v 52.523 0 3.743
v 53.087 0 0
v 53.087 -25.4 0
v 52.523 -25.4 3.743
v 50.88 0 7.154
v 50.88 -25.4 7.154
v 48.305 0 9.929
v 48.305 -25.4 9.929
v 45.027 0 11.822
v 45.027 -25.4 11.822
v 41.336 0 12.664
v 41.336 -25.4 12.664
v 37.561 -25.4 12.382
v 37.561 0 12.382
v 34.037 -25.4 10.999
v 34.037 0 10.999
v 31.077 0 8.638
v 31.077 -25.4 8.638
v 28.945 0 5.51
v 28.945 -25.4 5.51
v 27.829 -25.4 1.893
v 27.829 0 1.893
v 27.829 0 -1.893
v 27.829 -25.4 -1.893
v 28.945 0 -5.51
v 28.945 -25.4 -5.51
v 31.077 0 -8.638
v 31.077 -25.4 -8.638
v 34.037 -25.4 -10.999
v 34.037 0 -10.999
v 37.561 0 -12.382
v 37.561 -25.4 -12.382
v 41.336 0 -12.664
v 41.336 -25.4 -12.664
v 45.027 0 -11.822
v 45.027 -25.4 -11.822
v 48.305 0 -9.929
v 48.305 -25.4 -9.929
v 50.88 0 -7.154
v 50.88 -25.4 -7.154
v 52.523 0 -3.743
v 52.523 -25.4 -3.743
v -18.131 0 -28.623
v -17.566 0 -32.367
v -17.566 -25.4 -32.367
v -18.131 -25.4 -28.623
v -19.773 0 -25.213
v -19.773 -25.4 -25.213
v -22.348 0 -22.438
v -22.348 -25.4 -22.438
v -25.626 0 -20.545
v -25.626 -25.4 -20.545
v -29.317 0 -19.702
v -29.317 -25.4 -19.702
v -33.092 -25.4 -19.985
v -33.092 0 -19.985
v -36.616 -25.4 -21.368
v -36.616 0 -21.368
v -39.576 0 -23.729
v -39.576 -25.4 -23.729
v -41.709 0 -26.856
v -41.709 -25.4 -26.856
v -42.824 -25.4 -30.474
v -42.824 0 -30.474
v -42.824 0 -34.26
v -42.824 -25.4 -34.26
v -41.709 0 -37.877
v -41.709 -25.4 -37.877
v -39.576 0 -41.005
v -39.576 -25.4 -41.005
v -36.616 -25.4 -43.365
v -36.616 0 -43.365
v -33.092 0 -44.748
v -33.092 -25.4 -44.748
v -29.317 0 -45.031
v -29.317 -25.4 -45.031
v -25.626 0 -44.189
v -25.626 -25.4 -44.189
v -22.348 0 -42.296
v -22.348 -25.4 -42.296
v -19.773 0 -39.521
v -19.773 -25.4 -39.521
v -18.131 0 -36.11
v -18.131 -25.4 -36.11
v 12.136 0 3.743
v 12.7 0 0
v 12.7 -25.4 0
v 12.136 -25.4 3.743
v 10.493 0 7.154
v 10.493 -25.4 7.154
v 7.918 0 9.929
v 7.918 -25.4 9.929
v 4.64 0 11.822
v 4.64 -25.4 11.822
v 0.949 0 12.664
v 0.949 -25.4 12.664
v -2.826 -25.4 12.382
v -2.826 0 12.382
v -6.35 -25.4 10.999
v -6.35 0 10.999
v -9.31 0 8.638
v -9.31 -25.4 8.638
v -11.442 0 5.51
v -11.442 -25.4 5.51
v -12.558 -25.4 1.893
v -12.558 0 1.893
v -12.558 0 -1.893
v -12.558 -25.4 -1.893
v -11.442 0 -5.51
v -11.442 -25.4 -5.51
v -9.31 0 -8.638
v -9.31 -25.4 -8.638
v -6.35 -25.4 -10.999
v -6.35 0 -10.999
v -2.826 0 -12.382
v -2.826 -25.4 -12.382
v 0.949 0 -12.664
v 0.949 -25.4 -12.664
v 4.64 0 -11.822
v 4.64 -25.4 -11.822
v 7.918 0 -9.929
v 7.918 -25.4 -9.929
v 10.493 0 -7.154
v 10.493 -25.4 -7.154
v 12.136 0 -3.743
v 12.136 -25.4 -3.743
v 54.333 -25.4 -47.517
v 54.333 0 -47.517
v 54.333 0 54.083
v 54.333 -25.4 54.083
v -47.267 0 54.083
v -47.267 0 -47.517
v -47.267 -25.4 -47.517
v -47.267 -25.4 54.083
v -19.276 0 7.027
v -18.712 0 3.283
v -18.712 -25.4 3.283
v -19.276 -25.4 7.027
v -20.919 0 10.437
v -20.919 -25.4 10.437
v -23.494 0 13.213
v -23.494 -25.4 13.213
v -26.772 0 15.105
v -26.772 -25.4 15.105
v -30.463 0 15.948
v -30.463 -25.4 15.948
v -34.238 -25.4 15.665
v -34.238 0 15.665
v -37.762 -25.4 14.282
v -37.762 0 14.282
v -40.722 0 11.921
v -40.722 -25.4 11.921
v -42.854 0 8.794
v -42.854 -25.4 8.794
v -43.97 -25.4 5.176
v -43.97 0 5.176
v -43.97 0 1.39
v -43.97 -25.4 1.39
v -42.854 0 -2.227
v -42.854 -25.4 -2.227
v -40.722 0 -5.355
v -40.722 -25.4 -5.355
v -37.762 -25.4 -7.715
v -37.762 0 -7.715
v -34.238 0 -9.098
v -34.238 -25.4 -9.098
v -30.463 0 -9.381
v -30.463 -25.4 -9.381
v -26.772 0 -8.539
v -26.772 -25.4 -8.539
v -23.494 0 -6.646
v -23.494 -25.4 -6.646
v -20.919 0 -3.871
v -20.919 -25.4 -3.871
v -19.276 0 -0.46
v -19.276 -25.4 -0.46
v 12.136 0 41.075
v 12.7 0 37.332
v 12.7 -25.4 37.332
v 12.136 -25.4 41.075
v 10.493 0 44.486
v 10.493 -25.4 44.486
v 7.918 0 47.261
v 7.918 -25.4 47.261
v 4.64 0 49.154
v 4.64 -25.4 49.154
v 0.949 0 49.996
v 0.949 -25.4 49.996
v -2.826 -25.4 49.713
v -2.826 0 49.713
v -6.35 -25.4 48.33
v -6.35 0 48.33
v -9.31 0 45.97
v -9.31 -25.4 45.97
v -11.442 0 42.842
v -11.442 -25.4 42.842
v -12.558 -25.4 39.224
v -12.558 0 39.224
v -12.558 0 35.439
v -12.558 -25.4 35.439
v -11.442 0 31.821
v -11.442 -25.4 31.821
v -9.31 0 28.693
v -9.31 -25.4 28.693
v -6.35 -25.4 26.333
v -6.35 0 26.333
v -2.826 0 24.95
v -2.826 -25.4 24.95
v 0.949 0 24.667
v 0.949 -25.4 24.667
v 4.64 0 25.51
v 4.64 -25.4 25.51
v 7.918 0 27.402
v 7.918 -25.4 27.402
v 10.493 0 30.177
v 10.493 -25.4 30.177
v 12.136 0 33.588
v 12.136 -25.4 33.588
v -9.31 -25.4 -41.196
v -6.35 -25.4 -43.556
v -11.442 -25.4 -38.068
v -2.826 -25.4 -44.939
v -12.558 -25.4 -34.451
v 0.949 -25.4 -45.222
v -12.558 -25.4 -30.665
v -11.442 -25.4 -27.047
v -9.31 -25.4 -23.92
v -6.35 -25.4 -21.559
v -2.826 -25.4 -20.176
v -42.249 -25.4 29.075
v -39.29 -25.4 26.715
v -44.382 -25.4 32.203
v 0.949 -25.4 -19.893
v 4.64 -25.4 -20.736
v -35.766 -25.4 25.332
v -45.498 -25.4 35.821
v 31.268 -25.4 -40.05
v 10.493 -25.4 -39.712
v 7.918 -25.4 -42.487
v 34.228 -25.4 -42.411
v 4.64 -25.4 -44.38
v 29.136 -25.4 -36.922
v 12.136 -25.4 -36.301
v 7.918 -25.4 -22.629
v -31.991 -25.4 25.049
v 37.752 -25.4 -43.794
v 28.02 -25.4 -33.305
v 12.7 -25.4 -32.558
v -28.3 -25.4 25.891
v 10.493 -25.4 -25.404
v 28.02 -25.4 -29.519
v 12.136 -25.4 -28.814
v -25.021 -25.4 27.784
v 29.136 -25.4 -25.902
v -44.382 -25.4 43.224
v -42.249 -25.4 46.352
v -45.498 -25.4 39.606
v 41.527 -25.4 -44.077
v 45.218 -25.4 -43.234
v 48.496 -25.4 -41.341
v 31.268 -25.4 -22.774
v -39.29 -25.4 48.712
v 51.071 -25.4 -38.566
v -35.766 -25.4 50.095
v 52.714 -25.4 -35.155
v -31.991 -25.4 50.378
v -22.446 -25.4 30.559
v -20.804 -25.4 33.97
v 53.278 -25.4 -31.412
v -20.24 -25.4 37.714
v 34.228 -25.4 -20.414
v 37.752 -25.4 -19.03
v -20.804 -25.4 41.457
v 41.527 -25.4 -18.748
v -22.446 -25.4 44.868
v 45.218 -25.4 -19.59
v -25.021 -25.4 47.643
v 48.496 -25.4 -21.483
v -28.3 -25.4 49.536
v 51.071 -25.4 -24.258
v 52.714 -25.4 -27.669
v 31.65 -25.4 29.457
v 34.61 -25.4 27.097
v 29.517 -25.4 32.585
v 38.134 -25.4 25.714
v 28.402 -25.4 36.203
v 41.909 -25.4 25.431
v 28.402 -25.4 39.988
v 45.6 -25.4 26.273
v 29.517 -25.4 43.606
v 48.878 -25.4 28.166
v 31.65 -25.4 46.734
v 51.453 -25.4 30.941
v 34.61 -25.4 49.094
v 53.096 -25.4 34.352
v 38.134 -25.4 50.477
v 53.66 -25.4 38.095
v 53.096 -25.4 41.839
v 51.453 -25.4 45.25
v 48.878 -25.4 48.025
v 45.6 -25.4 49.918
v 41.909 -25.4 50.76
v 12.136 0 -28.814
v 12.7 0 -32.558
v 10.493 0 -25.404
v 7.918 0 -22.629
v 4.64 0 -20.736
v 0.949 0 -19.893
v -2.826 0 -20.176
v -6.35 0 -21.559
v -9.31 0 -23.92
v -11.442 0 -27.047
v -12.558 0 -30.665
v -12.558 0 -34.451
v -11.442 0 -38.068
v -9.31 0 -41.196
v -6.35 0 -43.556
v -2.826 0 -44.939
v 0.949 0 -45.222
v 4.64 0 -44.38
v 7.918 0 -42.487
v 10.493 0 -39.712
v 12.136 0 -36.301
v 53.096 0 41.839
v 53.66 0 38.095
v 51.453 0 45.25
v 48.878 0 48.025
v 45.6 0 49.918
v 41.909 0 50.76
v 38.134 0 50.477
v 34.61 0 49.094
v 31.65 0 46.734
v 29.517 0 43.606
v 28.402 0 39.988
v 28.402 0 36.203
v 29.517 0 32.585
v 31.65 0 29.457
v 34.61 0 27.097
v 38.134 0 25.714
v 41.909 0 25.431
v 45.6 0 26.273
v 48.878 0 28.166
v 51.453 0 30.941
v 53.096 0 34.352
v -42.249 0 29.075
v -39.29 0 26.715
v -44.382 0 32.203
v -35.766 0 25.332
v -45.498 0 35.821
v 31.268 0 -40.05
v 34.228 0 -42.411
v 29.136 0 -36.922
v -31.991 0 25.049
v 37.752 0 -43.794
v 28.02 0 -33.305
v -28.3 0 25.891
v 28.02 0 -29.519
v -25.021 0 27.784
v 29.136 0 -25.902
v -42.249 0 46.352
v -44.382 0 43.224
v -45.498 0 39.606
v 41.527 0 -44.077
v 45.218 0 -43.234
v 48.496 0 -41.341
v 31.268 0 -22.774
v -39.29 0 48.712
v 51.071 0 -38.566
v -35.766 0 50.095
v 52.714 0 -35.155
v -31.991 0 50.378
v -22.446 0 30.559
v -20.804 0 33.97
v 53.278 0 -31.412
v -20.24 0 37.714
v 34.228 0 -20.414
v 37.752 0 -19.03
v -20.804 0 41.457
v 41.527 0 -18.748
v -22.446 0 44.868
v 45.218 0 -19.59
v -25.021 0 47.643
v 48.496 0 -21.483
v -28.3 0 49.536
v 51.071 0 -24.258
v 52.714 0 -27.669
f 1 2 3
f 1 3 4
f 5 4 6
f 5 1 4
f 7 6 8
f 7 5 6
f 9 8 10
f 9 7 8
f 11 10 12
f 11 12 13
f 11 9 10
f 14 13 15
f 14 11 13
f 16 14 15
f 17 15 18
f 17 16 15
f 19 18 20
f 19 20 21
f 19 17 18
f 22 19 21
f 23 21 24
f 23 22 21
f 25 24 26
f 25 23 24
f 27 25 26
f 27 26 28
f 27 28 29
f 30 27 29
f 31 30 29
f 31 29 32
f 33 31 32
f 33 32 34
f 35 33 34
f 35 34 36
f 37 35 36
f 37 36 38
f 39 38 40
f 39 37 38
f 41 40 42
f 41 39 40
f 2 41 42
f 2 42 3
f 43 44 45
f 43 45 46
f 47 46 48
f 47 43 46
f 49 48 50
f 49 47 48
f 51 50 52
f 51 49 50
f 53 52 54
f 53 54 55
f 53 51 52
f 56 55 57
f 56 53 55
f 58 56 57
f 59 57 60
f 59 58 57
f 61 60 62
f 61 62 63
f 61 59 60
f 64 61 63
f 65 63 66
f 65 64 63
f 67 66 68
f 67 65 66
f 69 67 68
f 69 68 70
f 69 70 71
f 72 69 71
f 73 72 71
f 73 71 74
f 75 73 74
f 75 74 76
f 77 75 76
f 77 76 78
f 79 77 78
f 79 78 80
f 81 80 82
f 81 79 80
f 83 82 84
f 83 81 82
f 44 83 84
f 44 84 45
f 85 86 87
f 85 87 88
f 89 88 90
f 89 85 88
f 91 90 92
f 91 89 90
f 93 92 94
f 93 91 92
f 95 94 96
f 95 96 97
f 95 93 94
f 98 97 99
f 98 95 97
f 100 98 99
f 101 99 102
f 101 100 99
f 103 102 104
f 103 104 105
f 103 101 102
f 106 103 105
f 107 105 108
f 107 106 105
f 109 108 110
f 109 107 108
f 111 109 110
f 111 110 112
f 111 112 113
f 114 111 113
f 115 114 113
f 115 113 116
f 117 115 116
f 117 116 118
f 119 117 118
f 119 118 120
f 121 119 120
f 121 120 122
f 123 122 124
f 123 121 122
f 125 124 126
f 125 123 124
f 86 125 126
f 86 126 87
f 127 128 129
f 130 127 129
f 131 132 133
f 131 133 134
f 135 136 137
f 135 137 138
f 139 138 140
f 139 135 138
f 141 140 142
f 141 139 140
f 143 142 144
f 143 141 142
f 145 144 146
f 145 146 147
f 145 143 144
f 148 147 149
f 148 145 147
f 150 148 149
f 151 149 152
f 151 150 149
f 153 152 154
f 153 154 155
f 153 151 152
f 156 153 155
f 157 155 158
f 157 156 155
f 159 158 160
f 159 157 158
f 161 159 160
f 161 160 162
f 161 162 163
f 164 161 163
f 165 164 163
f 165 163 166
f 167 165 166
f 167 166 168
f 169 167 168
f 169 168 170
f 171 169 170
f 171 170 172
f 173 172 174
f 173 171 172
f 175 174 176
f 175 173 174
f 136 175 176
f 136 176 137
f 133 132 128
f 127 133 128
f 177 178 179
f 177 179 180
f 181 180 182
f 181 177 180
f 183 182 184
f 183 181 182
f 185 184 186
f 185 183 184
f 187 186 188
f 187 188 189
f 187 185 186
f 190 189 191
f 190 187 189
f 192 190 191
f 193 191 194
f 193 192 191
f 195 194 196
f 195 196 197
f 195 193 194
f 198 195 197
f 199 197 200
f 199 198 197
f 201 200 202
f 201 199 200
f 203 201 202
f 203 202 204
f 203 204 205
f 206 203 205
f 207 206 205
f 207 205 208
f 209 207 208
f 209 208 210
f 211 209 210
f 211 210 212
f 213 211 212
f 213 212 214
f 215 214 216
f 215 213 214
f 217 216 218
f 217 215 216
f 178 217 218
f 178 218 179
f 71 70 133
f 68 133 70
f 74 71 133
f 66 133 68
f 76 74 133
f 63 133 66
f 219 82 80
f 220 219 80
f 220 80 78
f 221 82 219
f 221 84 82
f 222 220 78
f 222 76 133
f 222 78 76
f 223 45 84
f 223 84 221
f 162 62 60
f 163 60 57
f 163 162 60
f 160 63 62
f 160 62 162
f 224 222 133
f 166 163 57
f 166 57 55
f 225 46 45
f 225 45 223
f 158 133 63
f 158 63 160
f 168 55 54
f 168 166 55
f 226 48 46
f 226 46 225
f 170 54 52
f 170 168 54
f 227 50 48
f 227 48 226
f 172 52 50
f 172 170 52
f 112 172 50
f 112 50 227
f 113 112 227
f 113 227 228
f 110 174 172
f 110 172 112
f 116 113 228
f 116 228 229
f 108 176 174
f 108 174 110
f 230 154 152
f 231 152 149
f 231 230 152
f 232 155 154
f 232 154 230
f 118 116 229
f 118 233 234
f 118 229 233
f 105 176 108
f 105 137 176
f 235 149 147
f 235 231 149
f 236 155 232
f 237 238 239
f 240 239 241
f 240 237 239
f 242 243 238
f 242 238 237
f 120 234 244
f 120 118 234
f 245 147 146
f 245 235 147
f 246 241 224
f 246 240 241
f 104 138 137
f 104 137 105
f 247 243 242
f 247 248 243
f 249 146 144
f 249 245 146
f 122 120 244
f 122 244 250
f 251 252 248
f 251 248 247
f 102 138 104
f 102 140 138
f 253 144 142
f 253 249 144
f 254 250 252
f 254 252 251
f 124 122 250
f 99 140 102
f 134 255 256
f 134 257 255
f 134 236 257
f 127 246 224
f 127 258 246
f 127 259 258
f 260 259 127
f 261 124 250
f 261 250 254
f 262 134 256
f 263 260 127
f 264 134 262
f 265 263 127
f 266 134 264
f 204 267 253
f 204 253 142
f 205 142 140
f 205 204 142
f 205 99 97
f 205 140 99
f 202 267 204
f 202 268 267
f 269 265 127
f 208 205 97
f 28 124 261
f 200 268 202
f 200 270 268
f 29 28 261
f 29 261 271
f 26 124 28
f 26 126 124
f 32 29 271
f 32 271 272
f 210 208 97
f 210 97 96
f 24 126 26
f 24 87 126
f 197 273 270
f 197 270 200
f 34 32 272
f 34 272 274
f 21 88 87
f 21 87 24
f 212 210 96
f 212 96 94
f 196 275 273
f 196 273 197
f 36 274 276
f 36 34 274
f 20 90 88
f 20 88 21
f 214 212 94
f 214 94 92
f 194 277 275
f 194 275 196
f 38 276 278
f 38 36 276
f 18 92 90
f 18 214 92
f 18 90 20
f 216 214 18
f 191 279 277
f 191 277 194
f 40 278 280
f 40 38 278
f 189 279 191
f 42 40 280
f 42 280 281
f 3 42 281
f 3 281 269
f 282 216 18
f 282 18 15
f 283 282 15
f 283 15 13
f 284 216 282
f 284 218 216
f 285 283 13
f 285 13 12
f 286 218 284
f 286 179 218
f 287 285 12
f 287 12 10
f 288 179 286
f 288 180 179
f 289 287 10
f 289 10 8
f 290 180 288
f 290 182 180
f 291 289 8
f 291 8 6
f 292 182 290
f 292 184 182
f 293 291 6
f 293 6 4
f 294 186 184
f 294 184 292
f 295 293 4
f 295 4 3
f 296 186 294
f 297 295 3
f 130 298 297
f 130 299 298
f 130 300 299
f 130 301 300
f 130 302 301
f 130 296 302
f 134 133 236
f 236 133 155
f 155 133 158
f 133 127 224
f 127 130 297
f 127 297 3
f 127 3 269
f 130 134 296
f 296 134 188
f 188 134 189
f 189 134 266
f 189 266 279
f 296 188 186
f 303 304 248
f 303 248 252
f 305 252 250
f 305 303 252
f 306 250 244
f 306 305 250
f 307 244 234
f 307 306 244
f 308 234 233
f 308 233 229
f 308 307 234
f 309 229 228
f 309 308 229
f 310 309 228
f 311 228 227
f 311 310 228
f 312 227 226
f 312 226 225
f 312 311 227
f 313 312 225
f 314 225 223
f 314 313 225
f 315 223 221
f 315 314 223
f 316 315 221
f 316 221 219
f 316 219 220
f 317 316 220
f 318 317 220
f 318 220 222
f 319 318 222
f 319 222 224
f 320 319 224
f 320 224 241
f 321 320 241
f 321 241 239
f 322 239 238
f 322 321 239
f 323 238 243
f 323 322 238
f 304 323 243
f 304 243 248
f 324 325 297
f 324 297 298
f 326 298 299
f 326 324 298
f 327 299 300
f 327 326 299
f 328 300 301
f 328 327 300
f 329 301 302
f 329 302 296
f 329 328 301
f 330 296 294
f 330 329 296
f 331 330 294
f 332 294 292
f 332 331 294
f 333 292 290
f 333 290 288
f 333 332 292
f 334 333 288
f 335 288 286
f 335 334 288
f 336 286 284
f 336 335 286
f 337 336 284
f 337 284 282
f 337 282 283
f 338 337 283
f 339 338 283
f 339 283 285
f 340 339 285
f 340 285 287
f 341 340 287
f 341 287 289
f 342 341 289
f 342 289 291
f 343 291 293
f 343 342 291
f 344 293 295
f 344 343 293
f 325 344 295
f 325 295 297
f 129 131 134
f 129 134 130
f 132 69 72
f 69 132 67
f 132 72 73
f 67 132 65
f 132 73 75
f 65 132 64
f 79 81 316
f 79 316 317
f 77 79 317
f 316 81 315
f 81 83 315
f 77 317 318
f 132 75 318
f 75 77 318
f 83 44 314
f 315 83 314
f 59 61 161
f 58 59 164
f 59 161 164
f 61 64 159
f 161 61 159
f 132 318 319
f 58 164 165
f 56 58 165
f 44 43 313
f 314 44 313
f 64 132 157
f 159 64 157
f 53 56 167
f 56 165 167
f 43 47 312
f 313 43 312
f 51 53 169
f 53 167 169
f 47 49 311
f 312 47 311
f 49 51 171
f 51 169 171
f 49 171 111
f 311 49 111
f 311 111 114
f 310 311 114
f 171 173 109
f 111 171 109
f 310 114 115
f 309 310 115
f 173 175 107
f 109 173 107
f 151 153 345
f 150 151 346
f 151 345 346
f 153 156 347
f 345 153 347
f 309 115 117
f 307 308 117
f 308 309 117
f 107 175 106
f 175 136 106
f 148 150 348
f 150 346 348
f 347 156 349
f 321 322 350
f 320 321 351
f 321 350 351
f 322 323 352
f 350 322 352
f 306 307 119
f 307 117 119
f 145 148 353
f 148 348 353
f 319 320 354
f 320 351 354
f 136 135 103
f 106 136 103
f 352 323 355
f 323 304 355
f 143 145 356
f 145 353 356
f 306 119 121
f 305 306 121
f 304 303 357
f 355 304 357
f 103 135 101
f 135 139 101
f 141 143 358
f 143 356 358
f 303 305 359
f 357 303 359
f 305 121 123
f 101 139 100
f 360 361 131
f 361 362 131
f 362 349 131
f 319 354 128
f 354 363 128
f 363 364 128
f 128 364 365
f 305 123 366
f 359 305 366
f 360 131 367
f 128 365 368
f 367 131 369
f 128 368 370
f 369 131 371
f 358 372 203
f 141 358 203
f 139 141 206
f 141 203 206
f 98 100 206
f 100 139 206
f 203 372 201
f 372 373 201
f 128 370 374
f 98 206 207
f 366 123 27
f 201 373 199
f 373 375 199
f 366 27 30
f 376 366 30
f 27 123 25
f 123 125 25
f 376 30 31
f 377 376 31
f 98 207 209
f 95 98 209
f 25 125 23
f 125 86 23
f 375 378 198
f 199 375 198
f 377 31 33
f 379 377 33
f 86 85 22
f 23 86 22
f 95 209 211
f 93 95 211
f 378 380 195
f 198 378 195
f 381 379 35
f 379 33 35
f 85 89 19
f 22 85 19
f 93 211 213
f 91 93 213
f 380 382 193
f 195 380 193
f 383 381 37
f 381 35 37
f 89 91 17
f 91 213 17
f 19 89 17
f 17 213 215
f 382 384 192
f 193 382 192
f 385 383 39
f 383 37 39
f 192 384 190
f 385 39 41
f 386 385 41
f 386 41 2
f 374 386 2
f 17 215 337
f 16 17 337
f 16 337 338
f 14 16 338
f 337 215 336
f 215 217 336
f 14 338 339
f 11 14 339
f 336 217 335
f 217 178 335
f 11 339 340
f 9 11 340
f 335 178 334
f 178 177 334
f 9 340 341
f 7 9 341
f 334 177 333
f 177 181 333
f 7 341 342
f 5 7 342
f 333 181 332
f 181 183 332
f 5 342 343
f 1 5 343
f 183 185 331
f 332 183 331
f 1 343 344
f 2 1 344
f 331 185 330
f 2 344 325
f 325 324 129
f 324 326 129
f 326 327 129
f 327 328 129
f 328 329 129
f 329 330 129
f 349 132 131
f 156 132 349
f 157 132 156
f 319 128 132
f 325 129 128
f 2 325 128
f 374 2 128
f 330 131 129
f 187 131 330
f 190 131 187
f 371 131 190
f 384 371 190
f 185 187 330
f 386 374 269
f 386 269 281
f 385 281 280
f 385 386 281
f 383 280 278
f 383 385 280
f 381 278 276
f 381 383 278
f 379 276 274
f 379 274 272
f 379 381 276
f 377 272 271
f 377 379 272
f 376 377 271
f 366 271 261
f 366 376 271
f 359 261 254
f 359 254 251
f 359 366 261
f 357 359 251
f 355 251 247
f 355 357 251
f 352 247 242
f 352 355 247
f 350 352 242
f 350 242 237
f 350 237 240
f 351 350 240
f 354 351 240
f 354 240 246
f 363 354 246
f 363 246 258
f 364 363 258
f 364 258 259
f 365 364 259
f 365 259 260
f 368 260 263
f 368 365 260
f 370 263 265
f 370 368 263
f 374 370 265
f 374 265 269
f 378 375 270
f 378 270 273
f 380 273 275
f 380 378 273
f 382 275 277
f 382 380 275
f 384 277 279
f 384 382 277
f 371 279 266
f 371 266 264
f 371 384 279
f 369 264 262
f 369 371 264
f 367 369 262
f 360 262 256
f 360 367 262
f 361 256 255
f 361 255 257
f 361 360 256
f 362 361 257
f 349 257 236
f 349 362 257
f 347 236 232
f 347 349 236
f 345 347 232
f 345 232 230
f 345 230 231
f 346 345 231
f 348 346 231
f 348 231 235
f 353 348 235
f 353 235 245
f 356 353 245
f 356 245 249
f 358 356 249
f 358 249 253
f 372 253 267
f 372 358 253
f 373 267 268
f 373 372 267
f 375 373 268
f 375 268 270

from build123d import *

# Parameters (mm, degrees)
F0_W     = 101.6
F0_H     = 101.6
F0_R     = 12.7
F1_DEPTH = 25.4


with BuildPart() as f1:
    # F0 (on Front) → F1 (new body)
    with BuildSketch(Plane.XZ):
        with Locations((3.532663, 3.283243)):
            Rectangle(F0_W, F0_H)
        with Locations((-30.266313, -32.366816)):
            Circle(F0_R, mode=Mode.SUBTRACT)
        with Locations((0, -32.557767)):
            Circle(F0_R, mode=Mode.SUBTRACT)
        Circle(F0_R, mode=Mode.SUBTRACT)
        with Locations((40.577866, -31.412043)):
            Circle(F0_R, mode=Mode.SUBTRACT)
        with Locations((40.386911, 0)):
            Circle(F0_R, mode=Mode.SUBTRACT)
        with Locations((-31.412043, 3.283243)):
            Circle(F0_R, mode=Mode.SUBTRACT)
        with Locations((-32.939676, 37.713546)):
            Circle(F0_R, mode=Mode.SUBTRACT)
        with Locations((0, 37.331637)):
            Circle(F0_R, mode=Mode.SUBTRACT)
        with Locations((40.959772, 38.095452)):
            Circle(F0_R, mode=Mode.SUBTRACT)
    extrude(amount=F1_DEPTH)


solid = f1.part
